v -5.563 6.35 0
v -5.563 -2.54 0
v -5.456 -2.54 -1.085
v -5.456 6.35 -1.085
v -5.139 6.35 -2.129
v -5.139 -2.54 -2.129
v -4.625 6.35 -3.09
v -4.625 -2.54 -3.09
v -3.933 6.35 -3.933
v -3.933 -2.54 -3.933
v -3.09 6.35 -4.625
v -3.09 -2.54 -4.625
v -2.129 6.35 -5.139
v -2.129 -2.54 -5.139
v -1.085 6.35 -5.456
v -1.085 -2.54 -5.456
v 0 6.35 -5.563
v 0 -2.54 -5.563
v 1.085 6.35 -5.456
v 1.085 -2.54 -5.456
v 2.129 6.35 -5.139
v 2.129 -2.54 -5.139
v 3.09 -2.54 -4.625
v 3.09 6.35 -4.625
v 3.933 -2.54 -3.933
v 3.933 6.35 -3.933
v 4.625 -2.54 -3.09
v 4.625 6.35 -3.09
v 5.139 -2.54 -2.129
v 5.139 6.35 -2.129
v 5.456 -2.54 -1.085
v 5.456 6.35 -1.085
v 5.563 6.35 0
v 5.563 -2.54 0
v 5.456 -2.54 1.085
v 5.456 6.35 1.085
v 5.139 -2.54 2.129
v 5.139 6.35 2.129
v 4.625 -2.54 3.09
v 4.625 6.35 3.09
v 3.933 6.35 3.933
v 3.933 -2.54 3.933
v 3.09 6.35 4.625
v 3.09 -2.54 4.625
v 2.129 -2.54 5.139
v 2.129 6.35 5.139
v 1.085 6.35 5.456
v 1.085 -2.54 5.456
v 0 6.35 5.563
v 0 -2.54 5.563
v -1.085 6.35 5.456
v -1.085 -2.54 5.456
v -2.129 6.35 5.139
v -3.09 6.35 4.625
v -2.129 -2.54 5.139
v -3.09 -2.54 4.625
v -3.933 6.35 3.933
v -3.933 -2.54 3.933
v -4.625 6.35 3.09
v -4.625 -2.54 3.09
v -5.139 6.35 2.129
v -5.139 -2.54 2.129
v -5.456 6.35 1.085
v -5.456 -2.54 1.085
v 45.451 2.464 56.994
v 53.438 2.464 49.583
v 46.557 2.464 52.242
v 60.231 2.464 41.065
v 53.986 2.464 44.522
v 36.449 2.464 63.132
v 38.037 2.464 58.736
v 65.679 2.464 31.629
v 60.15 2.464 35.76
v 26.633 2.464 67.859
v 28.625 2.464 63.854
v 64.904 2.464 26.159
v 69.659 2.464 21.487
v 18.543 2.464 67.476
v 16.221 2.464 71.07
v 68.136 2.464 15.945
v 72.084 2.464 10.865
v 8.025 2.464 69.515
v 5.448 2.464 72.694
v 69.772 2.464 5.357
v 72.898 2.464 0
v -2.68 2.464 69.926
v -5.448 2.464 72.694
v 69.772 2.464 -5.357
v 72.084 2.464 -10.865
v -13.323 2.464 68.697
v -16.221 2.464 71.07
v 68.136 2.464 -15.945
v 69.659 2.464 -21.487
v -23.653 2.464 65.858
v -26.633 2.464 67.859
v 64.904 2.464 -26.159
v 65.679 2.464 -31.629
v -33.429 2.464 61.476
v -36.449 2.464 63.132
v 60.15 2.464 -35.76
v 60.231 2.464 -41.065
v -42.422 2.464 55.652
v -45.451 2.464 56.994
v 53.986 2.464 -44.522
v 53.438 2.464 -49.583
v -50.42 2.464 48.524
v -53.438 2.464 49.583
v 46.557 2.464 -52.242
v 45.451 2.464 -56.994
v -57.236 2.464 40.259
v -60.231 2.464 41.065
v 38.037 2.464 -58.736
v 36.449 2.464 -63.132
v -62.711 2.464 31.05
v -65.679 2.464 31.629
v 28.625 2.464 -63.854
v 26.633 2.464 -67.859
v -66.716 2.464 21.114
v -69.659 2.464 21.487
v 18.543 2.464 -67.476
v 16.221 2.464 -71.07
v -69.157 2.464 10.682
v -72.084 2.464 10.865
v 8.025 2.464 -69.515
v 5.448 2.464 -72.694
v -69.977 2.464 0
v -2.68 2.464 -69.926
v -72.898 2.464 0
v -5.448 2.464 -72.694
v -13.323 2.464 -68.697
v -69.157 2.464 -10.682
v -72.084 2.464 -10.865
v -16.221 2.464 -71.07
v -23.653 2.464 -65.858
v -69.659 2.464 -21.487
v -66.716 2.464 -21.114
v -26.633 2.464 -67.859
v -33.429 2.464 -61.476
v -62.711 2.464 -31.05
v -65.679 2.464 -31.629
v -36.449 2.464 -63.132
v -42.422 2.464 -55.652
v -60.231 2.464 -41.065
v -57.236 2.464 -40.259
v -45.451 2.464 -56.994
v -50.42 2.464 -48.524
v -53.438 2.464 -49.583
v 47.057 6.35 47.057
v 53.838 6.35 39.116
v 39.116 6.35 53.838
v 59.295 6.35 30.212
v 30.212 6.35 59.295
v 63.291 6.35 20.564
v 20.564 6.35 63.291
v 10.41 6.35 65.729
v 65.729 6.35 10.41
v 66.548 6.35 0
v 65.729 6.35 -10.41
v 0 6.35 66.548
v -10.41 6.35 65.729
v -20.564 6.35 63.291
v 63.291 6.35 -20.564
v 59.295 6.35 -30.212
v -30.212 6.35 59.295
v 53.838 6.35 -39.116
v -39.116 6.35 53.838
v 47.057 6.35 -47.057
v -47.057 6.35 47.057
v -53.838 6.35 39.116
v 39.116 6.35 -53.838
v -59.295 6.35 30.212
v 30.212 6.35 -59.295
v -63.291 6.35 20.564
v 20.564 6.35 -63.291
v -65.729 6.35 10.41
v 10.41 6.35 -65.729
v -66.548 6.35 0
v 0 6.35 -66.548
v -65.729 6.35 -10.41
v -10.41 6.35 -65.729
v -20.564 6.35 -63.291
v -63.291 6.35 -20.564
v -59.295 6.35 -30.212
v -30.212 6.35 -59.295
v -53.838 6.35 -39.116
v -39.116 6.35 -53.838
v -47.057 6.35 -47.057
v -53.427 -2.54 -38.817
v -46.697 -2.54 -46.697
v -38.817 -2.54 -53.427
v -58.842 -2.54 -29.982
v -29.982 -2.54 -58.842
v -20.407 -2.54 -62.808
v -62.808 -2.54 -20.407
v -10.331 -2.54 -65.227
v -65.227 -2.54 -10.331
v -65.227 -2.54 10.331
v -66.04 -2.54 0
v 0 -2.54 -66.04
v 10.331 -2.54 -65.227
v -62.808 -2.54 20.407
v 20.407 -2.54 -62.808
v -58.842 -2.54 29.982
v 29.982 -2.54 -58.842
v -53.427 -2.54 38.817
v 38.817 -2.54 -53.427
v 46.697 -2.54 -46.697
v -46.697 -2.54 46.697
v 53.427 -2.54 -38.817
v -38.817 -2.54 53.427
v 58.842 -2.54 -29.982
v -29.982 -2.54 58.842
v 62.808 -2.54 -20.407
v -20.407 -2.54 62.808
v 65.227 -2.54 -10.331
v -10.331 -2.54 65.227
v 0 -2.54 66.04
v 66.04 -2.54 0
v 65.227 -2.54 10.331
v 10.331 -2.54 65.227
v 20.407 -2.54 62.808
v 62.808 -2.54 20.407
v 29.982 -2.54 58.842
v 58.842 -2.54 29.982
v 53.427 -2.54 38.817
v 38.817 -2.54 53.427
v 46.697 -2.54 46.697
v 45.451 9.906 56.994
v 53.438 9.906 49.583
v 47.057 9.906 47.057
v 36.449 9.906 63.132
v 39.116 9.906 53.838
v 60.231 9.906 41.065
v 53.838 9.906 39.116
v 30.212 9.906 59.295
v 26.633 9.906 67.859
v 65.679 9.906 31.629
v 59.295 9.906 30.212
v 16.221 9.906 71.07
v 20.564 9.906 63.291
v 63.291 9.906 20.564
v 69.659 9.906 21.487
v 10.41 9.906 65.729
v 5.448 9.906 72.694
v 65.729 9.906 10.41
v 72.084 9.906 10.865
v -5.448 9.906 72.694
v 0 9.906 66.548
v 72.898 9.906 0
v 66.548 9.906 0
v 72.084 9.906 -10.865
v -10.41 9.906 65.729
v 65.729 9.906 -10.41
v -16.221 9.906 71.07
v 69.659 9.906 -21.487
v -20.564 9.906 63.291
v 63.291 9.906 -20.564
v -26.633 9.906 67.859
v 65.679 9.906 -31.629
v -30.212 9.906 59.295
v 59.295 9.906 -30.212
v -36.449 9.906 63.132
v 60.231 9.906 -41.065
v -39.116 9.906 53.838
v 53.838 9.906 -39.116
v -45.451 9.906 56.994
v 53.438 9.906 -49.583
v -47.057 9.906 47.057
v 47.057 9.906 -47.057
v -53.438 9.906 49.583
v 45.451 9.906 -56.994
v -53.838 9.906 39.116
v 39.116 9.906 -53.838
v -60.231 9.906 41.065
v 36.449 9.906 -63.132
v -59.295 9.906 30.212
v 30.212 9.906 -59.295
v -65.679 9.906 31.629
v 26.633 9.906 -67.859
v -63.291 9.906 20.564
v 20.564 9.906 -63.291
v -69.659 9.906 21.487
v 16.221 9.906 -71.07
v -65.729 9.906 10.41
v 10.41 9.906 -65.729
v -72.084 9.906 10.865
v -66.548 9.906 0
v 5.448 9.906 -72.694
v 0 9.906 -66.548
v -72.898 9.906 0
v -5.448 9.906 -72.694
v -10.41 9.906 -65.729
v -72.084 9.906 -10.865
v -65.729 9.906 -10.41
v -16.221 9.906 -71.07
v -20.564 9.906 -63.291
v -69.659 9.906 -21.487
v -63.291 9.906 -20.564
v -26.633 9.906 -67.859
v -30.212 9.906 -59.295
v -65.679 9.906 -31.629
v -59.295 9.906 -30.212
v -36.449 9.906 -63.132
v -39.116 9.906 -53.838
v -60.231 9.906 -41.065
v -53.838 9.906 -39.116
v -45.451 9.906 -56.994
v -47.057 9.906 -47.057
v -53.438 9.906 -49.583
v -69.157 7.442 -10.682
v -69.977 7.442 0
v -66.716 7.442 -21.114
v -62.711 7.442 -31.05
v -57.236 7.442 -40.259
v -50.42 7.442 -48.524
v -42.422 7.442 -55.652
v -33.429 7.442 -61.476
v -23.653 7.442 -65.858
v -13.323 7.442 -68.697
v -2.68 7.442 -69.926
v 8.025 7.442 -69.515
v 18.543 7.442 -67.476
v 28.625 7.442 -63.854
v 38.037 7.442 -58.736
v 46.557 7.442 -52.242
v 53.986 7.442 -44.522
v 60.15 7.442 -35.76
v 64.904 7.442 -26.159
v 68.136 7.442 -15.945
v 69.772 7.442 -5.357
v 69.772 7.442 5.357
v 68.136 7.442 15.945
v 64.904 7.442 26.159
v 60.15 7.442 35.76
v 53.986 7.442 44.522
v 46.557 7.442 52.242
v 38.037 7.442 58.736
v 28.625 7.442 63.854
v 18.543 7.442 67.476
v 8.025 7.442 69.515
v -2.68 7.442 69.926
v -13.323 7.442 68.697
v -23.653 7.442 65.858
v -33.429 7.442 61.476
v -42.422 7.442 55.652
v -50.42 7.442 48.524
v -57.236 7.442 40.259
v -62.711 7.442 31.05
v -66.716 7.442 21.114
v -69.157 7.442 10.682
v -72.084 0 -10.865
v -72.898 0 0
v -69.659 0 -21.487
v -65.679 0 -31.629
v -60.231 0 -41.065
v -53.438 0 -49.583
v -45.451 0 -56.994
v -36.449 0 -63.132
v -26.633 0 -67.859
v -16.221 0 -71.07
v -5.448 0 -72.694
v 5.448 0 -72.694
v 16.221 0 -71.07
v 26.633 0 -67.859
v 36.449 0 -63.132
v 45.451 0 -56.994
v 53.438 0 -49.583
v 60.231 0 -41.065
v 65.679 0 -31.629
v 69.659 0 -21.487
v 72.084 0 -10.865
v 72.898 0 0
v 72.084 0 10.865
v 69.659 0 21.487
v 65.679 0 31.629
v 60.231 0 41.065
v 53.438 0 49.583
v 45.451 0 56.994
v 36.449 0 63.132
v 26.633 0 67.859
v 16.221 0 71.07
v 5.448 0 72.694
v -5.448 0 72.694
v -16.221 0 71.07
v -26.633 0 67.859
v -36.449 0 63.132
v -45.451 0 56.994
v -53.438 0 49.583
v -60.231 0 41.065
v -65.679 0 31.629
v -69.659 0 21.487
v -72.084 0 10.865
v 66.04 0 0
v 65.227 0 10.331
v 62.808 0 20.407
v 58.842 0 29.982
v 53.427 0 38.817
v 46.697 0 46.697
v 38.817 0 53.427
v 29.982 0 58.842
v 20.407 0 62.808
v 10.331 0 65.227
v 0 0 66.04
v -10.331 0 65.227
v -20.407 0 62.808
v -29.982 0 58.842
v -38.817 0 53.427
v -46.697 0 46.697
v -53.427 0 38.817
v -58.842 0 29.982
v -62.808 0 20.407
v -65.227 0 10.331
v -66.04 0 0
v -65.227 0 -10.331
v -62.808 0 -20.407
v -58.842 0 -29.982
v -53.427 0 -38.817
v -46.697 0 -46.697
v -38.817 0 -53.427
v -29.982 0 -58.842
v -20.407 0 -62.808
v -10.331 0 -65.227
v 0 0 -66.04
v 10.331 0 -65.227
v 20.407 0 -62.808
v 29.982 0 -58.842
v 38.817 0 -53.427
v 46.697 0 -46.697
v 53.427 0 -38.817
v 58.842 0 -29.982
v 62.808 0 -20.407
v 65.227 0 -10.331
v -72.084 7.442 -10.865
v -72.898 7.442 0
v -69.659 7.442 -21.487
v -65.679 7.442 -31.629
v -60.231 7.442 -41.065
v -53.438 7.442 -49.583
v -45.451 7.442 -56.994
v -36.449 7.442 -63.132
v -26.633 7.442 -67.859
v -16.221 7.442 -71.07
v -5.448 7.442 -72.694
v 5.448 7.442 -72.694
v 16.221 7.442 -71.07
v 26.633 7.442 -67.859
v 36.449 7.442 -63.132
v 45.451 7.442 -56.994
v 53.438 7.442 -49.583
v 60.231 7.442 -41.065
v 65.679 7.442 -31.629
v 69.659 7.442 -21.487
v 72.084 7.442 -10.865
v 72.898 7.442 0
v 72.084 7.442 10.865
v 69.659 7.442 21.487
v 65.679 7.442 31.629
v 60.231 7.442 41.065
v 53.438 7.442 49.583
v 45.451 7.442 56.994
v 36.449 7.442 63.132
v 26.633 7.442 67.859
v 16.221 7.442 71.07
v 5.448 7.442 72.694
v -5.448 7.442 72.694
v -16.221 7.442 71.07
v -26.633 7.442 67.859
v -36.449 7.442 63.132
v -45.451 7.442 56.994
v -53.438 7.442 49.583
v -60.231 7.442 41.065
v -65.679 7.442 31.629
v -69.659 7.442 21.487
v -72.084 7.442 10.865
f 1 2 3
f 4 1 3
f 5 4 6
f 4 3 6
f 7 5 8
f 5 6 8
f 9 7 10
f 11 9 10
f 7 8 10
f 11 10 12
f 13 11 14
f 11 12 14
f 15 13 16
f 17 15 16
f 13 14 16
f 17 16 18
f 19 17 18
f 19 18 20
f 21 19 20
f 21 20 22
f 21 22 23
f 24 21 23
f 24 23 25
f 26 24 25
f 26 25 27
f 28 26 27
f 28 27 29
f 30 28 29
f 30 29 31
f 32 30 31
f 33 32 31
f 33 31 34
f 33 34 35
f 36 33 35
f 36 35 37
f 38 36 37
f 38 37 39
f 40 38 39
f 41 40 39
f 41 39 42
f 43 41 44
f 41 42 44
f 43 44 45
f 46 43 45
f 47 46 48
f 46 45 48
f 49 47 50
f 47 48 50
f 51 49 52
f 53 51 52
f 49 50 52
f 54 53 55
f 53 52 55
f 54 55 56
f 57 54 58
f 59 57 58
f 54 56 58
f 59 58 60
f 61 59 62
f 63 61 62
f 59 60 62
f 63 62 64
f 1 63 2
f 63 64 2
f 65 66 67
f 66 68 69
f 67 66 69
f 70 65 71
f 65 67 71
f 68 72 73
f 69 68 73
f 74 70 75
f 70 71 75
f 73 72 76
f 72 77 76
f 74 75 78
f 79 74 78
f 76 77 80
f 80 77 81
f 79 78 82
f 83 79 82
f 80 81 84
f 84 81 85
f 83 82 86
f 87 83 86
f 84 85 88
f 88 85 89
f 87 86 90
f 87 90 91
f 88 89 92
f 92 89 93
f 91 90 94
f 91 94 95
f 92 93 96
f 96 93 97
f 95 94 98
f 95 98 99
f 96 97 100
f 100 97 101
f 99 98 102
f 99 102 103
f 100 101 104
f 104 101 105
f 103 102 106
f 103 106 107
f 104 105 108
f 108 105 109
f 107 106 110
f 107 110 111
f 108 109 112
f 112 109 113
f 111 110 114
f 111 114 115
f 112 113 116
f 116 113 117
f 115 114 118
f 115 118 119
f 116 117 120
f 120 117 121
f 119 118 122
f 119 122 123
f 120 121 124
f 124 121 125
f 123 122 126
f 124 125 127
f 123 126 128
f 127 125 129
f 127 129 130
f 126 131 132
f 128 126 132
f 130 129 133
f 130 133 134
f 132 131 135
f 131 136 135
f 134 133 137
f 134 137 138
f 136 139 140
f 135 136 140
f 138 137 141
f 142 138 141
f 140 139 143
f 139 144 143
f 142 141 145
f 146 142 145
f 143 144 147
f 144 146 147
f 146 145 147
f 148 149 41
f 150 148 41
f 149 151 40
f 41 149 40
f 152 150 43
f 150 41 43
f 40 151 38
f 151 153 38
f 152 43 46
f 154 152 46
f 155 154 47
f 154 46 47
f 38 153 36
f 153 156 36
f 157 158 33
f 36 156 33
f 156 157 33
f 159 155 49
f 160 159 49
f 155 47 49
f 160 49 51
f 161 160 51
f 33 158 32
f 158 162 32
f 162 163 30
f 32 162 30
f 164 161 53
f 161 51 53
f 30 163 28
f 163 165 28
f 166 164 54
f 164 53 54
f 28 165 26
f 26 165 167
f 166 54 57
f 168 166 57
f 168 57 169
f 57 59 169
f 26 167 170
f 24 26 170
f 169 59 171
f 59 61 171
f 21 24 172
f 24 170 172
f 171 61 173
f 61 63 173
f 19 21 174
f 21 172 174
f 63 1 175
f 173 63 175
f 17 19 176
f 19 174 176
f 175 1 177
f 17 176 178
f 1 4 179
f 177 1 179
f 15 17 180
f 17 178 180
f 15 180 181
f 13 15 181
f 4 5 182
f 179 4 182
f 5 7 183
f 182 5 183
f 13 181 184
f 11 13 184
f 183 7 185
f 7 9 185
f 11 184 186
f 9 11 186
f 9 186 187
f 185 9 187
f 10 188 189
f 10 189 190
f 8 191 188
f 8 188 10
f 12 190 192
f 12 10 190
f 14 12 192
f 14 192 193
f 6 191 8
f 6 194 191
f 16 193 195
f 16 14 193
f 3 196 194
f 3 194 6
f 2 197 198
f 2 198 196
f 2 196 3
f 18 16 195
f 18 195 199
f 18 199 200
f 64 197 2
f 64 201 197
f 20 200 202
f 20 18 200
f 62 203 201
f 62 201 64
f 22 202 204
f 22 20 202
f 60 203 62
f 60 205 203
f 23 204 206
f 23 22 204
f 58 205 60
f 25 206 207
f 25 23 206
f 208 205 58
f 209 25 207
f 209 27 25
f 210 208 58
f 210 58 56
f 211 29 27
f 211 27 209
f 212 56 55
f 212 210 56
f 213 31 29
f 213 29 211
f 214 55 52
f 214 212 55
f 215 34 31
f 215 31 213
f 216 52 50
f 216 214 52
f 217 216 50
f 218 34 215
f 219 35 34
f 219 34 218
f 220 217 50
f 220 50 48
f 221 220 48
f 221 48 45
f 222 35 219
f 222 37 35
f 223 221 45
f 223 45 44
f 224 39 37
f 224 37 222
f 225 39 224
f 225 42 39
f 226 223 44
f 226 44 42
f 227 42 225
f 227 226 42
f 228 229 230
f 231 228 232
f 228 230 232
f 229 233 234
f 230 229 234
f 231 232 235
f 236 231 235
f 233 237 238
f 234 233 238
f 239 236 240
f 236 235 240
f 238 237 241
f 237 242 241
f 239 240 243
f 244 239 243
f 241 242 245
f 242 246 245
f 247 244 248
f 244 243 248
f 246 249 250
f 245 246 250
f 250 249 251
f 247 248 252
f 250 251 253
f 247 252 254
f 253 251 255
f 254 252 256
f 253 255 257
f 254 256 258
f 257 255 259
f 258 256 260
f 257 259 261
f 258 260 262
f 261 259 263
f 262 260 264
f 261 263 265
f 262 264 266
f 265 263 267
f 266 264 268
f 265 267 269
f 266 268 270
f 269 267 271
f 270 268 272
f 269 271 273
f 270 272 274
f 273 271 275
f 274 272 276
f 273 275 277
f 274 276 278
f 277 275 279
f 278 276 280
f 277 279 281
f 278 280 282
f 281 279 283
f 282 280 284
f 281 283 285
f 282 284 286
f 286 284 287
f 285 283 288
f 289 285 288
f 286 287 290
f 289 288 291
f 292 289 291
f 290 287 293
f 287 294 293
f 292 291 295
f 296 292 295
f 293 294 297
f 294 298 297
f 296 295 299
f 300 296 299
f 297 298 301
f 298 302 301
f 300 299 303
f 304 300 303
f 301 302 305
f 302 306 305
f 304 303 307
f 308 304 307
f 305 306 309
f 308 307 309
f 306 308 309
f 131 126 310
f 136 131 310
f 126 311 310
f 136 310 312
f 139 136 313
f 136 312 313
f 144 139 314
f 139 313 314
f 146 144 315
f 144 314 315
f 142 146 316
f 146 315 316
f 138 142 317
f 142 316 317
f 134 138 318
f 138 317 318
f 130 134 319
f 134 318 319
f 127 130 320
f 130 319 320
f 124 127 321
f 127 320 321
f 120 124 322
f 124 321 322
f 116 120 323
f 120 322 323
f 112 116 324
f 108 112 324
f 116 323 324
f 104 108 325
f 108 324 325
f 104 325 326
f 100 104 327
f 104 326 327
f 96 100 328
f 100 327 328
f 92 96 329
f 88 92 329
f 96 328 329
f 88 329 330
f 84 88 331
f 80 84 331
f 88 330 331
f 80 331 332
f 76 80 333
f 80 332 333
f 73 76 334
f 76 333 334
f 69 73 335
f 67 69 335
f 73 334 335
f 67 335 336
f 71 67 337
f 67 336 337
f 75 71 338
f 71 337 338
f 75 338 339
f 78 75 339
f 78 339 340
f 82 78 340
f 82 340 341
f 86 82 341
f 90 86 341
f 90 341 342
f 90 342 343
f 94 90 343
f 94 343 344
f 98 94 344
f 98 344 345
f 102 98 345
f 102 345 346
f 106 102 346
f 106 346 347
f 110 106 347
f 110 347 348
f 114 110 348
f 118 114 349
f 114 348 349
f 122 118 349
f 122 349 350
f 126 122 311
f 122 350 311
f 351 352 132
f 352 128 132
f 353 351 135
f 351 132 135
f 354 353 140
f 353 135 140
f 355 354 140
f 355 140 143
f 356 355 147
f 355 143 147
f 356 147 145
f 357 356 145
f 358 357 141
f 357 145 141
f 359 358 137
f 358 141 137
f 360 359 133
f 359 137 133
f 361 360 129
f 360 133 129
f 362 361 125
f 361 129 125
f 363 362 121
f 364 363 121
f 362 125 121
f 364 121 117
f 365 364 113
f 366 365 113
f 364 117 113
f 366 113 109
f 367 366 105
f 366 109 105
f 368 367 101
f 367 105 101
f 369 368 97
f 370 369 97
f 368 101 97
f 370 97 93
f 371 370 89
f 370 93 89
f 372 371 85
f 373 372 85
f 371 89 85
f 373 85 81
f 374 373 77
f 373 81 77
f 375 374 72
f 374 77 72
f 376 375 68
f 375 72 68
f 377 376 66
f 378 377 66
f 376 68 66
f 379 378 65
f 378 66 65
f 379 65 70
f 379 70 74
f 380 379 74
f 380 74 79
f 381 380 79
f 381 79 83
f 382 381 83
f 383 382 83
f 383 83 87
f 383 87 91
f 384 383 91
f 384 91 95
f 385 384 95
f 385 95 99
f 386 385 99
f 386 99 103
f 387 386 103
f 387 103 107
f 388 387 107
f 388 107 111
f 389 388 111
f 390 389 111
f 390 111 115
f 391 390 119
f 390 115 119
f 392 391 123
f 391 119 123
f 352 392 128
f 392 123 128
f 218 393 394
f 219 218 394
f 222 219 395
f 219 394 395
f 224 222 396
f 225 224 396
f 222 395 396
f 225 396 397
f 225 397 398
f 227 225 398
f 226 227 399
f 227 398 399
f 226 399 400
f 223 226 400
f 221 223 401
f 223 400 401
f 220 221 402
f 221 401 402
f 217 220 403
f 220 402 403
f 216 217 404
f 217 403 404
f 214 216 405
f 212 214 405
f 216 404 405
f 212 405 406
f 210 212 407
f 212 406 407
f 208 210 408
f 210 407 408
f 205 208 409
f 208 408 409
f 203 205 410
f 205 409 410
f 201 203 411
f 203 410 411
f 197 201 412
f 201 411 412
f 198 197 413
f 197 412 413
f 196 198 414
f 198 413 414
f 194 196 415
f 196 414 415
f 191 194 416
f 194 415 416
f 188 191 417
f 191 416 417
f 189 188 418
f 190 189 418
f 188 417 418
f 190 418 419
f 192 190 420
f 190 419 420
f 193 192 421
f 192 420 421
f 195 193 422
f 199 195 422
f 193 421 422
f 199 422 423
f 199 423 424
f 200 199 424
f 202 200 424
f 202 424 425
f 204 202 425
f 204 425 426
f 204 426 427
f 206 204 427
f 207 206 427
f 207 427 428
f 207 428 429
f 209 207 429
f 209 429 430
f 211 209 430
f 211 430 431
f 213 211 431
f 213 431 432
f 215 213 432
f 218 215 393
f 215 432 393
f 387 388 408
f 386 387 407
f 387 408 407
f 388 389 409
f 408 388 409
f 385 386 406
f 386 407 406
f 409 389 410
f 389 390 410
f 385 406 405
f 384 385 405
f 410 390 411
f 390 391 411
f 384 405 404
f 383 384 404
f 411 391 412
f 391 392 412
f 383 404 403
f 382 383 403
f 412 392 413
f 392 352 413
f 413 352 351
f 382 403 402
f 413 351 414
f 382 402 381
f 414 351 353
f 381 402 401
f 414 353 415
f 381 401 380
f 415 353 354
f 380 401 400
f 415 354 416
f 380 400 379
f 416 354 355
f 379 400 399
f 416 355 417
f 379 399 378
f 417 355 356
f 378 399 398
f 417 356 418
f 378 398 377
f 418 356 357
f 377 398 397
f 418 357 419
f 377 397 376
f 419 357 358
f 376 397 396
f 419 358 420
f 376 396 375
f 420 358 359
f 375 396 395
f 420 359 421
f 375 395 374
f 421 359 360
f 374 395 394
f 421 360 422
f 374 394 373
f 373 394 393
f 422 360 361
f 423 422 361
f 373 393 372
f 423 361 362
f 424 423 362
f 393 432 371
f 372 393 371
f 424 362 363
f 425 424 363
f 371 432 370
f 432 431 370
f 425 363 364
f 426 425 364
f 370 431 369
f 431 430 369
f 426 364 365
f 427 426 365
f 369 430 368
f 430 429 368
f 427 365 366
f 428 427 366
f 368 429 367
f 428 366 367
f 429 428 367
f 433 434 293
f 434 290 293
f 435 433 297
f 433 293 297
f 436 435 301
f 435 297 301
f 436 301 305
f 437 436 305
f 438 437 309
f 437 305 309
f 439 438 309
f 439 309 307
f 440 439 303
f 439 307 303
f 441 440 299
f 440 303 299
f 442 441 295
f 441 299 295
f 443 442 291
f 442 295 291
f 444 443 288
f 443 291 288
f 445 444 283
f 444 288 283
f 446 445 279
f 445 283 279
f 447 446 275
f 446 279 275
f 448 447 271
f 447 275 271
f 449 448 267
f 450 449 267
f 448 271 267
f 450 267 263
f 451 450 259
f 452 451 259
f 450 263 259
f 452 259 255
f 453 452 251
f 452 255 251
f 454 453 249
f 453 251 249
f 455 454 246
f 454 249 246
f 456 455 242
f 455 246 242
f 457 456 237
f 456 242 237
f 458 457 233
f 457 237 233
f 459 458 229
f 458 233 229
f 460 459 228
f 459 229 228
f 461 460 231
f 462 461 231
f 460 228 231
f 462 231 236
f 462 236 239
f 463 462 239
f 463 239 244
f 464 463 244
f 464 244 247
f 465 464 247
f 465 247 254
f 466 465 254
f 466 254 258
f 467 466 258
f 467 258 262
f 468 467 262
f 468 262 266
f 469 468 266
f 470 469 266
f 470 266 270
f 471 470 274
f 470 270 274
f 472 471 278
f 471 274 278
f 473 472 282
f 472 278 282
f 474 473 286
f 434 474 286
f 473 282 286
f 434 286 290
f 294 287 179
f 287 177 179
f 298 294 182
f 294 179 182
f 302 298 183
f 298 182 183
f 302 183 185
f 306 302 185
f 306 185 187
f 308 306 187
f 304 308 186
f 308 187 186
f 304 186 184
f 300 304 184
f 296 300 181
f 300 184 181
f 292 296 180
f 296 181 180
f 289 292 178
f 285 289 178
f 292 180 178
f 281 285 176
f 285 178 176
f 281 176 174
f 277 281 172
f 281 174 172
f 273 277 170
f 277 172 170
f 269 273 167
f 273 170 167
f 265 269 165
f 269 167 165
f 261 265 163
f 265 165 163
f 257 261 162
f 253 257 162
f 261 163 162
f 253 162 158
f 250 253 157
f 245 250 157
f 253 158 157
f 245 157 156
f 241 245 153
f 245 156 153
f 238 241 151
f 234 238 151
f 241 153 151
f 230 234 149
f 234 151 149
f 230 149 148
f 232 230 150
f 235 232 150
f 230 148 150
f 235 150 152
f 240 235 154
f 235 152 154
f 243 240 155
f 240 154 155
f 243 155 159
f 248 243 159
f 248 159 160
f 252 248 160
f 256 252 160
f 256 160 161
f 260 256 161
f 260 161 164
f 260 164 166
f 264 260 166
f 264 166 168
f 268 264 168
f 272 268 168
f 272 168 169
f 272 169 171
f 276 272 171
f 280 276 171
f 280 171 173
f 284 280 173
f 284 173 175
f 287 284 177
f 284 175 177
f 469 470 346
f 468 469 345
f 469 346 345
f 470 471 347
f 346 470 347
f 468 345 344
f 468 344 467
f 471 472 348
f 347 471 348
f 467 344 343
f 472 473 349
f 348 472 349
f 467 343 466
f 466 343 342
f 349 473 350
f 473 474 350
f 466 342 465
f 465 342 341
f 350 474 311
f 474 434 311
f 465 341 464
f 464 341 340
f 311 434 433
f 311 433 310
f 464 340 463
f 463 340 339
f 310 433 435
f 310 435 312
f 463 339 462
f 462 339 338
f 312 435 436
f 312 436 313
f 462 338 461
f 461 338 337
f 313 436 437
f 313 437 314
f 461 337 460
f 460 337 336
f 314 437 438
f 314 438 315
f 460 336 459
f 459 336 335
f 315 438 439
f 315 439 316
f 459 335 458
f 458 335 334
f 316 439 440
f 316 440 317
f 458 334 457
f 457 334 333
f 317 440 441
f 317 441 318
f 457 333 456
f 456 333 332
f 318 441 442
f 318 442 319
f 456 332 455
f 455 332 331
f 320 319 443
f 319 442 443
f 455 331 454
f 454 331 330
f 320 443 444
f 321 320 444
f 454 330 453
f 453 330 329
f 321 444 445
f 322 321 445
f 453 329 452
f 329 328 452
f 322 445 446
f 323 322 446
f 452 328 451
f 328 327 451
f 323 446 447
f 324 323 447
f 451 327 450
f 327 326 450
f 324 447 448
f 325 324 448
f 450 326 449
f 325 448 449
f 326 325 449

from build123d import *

# Parameters (mm, degrees)
SKETCH6_R                        = 66.04
BOSS_EXTRUDE1_DEPTH              = 2.54
PIPE_TAP_DRILL_FOR_1_4_TAP_GN2_D = 11.1252


with BuildPart() as part:
    # Sketch1 → Revolve1 (revolve)
    with BuildSketch(Plane.XY, mode=Mode.PRIVATE) as revolve1_sk:
        Polygon((0, 0), (72.898, 0), (72.898, 2.4638), (69.977, 2.4638), (69.977, 7.4422), (72.898, 7.4422), (72.898, 9.906), (66.548, 9.906), (66.548, 6.35), (0, 6.35), align=None)
    revolve(revolve1_sk.sketch.rotate(Axis((0, 48.192213231, 0), (0, -1, 0)), 180), axis=Axis((0, 48.192213231, 0), (0, -1, 0)))

    # Sketch6 → Boss-Extrude1 (add)
    with BuildSketch(Plane.XZ):
        Circle(SKETCH6_R)
    extrude(amount=BOSS_EXTRUDE1_DEPTH)

    # Pipe Tap Drill for 1/4 Tap - GN2 (through all)
    with Locations(Plane(origin=(0, 6.35, 0), x_dir=(1, 0, 0), z_dir=(0, 1, 0))):
        with Locations((0, 0)):
            Hole(PIPE_TAP_DRILL_FOR_1_4_TAP_GN2_D / 2)


solid = part.part
